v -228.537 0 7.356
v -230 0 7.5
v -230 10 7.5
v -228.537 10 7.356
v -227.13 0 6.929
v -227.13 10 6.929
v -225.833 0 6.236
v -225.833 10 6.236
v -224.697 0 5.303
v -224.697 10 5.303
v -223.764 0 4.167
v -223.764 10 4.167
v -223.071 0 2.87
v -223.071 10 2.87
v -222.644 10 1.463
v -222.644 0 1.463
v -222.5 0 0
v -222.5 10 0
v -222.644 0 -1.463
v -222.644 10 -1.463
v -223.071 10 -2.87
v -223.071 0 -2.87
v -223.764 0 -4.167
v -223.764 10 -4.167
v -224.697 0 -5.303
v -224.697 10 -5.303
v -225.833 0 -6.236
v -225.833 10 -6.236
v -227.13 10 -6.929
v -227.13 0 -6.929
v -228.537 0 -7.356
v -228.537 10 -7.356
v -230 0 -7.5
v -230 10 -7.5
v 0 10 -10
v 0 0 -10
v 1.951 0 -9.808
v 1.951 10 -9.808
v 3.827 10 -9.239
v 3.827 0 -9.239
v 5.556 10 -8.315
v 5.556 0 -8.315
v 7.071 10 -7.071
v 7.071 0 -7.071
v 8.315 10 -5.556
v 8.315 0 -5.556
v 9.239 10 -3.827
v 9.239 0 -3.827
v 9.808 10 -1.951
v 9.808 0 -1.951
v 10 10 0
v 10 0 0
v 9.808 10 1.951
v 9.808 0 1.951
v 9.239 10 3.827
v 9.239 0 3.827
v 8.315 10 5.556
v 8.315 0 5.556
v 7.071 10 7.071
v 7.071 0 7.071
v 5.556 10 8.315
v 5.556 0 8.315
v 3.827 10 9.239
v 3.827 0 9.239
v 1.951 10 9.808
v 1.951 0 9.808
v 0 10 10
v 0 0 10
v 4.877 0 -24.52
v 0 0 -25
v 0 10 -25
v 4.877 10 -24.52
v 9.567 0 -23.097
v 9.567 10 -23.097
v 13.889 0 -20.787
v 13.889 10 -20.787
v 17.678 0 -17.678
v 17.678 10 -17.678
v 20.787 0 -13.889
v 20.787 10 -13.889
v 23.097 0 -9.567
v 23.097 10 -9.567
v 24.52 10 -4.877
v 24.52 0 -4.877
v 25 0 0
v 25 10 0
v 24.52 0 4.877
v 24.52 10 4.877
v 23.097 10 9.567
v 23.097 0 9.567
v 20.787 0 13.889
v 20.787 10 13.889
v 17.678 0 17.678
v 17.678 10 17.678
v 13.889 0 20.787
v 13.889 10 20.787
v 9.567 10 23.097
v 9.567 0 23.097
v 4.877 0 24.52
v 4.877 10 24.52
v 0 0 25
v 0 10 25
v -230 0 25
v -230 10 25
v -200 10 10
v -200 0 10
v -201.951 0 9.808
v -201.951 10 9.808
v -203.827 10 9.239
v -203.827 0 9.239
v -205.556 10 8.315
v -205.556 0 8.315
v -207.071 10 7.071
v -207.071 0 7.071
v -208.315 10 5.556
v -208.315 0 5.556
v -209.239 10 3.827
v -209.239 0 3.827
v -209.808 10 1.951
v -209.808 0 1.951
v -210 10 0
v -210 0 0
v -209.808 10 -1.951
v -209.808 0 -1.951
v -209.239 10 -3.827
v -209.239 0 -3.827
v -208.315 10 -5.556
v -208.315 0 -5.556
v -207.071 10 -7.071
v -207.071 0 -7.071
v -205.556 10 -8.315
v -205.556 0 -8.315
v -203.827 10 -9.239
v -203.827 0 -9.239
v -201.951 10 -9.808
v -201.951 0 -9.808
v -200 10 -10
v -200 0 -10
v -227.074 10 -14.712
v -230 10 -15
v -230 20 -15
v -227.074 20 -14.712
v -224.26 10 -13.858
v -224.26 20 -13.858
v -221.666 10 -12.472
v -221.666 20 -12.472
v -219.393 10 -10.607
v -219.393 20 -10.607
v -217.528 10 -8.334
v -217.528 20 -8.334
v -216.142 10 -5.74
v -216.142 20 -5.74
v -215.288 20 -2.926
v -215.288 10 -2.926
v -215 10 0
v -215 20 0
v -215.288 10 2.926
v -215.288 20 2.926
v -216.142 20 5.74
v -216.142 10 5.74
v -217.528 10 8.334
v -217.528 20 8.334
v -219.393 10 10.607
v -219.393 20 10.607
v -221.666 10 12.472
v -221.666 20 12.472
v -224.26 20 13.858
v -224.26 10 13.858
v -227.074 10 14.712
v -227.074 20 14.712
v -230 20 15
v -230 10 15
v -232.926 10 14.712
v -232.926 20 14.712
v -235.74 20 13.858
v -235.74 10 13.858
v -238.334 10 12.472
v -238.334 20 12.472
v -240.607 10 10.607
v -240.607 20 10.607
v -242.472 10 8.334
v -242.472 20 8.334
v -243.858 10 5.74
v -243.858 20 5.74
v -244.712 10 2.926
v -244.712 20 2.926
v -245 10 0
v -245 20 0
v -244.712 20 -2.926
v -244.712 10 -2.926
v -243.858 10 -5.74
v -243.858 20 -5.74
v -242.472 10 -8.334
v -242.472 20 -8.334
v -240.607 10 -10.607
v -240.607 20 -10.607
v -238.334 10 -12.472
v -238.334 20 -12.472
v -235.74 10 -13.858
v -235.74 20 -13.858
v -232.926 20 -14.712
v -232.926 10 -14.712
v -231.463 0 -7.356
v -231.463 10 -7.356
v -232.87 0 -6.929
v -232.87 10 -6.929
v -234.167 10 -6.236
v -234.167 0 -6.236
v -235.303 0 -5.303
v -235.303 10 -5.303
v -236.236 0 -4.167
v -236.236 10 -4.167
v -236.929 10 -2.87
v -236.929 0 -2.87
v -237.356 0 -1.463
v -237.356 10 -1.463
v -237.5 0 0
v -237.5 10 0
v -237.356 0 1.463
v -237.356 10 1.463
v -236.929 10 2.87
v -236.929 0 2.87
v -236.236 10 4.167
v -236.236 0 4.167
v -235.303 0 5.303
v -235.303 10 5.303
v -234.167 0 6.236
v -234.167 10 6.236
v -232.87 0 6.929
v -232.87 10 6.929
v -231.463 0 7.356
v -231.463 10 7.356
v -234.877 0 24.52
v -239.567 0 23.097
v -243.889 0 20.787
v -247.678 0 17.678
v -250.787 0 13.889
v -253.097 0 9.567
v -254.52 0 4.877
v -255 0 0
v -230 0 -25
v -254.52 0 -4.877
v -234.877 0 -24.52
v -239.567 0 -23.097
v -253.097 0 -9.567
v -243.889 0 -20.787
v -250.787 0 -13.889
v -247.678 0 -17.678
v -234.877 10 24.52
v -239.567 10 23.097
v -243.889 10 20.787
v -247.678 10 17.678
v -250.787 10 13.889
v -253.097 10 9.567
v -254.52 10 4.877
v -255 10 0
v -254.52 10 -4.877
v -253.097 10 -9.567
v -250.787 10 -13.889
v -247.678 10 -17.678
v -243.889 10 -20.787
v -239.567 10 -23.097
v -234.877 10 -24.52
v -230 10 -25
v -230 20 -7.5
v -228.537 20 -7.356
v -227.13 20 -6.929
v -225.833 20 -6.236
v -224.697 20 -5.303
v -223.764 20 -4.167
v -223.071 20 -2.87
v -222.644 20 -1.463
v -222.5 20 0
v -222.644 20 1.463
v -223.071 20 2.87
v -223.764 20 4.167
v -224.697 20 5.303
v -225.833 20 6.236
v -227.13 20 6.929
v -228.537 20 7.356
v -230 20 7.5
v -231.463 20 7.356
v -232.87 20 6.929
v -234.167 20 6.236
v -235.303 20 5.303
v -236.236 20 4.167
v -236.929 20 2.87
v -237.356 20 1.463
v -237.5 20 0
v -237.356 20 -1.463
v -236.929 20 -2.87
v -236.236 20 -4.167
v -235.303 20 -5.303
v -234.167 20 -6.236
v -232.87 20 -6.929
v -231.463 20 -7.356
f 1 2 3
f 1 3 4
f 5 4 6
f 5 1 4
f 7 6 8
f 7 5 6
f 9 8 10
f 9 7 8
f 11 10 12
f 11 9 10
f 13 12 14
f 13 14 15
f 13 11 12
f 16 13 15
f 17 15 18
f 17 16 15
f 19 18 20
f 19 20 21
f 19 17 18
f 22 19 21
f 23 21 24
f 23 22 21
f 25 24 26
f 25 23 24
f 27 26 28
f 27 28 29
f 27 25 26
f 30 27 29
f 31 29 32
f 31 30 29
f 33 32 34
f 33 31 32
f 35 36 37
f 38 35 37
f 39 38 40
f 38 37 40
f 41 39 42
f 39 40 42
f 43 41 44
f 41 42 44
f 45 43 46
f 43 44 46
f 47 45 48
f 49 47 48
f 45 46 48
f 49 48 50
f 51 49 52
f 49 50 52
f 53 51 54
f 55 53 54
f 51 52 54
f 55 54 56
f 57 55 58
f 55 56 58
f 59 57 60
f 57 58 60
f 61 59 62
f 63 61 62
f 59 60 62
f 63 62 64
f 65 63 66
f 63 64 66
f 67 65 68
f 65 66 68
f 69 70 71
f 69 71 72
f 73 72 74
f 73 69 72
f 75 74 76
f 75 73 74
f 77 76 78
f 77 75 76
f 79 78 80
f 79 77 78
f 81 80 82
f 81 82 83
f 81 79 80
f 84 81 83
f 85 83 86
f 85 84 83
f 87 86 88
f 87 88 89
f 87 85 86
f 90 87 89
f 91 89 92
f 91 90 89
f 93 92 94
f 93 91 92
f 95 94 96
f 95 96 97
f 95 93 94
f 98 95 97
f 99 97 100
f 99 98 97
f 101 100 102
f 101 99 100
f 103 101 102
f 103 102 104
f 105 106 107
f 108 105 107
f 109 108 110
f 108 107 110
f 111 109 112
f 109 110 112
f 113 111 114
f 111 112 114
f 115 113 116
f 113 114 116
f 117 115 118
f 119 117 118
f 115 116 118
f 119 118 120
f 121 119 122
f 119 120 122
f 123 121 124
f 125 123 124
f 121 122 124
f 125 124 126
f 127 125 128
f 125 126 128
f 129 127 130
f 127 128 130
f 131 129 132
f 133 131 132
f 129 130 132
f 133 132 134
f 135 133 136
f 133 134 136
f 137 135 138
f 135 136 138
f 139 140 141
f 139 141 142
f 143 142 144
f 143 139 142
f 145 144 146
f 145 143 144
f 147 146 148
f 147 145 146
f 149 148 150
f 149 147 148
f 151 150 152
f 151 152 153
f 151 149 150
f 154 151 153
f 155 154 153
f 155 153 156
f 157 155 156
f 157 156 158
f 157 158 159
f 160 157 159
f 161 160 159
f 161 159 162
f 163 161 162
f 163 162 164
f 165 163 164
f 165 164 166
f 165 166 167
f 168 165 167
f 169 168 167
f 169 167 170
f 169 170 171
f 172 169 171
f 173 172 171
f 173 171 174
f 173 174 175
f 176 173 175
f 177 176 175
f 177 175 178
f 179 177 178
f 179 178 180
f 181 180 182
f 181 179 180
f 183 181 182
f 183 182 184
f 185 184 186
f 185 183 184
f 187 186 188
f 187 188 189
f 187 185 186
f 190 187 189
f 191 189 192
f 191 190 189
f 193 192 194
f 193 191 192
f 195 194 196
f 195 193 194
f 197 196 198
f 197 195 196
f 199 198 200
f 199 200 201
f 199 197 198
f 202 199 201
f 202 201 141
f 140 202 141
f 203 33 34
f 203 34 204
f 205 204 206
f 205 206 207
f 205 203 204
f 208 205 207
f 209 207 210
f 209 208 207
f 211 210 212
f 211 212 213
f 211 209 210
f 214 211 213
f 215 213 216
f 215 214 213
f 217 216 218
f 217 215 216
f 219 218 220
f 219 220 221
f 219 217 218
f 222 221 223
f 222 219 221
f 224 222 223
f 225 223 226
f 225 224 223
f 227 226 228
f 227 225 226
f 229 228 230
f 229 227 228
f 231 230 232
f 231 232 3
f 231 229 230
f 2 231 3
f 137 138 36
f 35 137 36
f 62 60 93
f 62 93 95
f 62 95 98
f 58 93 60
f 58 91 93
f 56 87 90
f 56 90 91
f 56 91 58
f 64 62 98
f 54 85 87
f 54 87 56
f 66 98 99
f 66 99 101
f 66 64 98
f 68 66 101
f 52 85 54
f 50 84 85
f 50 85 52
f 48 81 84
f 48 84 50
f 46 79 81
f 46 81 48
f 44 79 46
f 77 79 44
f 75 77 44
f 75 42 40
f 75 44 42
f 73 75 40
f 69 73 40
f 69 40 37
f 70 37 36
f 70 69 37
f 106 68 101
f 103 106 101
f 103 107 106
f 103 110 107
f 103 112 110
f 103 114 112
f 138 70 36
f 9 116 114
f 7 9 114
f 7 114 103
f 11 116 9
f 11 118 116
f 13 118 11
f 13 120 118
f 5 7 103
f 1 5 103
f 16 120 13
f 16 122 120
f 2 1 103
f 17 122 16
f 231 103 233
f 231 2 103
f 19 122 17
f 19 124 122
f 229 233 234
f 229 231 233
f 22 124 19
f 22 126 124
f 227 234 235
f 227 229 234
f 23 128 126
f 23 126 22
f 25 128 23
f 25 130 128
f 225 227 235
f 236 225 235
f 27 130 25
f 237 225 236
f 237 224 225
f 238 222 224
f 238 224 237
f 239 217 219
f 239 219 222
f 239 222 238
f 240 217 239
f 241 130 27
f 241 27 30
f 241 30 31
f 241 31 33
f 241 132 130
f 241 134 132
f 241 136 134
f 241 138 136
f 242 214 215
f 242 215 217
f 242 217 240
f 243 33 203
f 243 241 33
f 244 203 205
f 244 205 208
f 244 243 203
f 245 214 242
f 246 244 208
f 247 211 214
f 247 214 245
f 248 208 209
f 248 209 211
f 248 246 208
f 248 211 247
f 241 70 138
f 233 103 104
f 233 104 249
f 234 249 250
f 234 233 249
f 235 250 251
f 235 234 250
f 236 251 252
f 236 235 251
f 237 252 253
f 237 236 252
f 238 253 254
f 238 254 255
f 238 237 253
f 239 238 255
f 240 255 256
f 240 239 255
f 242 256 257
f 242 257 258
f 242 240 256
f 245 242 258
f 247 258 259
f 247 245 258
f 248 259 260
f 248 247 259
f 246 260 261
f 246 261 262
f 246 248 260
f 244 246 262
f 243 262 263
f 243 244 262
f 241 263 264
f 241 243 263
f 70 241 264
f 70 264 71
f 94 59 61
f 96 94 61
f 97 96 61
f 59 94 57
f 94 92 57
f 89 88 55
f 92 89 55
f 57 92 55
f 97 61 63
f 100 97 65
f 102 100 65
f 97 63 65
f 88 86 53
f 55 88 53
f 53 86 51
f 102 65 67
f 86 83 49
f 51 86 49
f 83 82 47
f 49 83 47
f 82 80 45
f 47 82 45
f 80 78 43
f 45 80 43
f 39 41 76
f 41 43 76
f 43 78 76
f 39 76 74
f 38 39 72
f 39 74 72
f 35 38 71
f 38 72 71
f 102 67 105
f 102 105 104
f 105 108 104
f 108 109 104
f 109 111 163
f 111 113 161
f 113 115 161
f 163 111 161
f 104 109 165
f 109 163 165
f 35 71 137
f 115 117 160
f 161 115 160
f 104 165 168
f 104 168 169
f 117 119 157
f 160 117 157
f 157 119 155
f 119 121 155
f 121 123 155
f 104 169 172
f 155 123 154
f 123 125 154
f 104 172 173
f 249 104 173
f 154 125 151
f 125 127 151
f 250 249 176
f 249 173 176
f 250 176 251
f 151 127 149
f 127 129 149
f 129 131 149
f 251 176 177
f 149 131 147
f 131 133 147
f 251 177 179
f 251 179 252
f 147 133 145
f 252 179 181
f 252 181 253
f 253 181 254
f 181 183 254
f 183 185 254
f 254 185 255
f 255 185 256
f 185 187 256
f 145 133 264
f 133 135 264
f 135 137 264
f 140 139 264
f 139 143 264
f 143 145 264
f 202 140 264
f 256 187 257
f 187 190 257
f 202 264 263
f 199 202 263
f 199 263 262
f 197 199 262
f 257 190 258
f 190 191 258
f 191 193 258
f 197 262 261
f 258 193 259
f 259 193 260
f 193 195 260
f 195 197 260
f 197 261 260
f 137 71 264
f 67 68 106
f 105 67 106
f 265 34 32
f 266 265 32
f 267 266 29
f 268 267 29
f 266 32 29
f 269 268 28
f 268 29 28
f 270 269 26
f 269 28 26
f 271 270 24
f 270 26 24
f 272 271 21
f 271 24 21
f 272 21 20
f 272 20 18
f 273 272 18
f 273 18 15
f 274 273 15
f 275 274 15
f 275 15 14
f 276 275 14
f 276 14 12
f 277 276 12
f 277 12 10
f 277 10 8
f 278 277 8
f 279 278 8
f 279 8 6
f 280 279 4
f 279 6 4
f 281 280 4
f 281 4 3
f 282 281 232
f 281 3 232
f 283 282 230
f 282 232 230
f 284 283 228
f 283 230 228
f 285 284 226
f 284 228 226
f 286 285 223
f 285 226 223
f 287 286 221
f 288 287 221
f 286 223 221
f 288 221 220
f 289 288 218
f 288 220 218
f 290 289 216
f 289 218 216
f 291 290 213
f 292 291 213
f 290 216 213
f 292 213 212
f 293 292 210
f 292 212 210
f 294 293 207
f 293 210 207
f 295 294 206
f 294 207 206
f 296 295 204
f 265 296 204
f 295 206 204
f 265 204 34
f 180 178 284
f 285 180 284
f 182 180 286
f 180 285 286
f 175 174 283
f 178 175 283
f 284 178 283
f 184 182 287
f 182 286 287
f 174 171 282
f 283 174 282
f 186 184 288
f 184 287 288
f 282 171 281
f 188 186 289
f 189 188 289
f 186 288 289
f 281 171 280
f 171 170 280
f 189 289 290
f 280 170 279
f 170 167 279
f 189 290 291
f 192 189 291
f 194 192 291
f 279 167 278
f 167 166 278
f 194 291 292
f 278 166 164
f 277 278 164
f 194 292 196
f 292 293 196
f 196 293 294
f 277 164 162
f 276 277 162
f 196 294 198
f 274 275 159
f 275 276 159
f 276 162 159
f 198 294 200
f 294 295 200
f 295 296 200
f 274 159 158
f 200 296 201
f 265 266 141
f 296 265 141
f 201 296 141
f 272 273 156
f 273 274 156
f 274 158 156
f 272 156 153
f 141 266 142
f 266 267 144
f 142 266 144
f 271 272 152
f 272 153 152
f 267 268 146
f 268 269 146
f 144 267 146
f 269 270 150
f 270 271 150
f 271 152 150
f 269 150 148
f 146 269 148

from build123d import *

# Parameters (mm, degrees)
SKETCH2_R           = 7.5
BOSS_EXTRUDE1_DEPTH = 10
SKETCH3_R           = 15
SKETCH3_R_2         = 7.5
BOSS_EXTRUDE2_DEPTH = 20


with BuildPart() as part:
    # Sketch2 → Boss-Extrude1 (new body)
    with BuildSketch(Plane(origin=(0, 0, 0), x_dir=(1, 0, 0), z_dir=(0, 1, 0))):
        with BuildLine():
            Line((-230, 25), (0, 25))
            ThreePointArc((0, 25), (25, 0), (0, -25))
            Line((0, -25), (-230, -25))
            ThreePointArc((-230, -25), (-255, 0), (-230, 25))
        make_face()
        with Locations(Location((-230, 0, 0), (0, 0, 270))):
            Circle(SKETCH2_R, mode=Mode.SUBTRACT)
        with BuildLine():
            Line((-190, 10), (0, 10))
            ThreePointArc((0, 10), (10, 0), (0, -10))
            Line((0, -10), (-190, -10))
            Line((-190, -10), (-200, -10))
            ThreePointArc((-200, -10), (-210, 0), (-200, 10))
            Line((-200, 10), (-190, 10))
        make_face(mode=Mode.SUBTRACT)
    extrude(amount=BOSS_EXTRUDE1_DEPTH)

    # Sketch3 → Boss-Extrude2 (add)
    with BuildSketch(Plane.XZ):
        with Locations(Location((-230, 0, 0), (0, 0, 270))):
            Circle(SKETCH3_R)
        with Locations(Location((-230, 0, 0), (0, 0, 270))):
            Circle(SKETCH3_R_2, mode=Mode.SUBTRACT)
    extrude(amount=-BOSS_EXTRUDE2_DEPTH)


solid = part.part
